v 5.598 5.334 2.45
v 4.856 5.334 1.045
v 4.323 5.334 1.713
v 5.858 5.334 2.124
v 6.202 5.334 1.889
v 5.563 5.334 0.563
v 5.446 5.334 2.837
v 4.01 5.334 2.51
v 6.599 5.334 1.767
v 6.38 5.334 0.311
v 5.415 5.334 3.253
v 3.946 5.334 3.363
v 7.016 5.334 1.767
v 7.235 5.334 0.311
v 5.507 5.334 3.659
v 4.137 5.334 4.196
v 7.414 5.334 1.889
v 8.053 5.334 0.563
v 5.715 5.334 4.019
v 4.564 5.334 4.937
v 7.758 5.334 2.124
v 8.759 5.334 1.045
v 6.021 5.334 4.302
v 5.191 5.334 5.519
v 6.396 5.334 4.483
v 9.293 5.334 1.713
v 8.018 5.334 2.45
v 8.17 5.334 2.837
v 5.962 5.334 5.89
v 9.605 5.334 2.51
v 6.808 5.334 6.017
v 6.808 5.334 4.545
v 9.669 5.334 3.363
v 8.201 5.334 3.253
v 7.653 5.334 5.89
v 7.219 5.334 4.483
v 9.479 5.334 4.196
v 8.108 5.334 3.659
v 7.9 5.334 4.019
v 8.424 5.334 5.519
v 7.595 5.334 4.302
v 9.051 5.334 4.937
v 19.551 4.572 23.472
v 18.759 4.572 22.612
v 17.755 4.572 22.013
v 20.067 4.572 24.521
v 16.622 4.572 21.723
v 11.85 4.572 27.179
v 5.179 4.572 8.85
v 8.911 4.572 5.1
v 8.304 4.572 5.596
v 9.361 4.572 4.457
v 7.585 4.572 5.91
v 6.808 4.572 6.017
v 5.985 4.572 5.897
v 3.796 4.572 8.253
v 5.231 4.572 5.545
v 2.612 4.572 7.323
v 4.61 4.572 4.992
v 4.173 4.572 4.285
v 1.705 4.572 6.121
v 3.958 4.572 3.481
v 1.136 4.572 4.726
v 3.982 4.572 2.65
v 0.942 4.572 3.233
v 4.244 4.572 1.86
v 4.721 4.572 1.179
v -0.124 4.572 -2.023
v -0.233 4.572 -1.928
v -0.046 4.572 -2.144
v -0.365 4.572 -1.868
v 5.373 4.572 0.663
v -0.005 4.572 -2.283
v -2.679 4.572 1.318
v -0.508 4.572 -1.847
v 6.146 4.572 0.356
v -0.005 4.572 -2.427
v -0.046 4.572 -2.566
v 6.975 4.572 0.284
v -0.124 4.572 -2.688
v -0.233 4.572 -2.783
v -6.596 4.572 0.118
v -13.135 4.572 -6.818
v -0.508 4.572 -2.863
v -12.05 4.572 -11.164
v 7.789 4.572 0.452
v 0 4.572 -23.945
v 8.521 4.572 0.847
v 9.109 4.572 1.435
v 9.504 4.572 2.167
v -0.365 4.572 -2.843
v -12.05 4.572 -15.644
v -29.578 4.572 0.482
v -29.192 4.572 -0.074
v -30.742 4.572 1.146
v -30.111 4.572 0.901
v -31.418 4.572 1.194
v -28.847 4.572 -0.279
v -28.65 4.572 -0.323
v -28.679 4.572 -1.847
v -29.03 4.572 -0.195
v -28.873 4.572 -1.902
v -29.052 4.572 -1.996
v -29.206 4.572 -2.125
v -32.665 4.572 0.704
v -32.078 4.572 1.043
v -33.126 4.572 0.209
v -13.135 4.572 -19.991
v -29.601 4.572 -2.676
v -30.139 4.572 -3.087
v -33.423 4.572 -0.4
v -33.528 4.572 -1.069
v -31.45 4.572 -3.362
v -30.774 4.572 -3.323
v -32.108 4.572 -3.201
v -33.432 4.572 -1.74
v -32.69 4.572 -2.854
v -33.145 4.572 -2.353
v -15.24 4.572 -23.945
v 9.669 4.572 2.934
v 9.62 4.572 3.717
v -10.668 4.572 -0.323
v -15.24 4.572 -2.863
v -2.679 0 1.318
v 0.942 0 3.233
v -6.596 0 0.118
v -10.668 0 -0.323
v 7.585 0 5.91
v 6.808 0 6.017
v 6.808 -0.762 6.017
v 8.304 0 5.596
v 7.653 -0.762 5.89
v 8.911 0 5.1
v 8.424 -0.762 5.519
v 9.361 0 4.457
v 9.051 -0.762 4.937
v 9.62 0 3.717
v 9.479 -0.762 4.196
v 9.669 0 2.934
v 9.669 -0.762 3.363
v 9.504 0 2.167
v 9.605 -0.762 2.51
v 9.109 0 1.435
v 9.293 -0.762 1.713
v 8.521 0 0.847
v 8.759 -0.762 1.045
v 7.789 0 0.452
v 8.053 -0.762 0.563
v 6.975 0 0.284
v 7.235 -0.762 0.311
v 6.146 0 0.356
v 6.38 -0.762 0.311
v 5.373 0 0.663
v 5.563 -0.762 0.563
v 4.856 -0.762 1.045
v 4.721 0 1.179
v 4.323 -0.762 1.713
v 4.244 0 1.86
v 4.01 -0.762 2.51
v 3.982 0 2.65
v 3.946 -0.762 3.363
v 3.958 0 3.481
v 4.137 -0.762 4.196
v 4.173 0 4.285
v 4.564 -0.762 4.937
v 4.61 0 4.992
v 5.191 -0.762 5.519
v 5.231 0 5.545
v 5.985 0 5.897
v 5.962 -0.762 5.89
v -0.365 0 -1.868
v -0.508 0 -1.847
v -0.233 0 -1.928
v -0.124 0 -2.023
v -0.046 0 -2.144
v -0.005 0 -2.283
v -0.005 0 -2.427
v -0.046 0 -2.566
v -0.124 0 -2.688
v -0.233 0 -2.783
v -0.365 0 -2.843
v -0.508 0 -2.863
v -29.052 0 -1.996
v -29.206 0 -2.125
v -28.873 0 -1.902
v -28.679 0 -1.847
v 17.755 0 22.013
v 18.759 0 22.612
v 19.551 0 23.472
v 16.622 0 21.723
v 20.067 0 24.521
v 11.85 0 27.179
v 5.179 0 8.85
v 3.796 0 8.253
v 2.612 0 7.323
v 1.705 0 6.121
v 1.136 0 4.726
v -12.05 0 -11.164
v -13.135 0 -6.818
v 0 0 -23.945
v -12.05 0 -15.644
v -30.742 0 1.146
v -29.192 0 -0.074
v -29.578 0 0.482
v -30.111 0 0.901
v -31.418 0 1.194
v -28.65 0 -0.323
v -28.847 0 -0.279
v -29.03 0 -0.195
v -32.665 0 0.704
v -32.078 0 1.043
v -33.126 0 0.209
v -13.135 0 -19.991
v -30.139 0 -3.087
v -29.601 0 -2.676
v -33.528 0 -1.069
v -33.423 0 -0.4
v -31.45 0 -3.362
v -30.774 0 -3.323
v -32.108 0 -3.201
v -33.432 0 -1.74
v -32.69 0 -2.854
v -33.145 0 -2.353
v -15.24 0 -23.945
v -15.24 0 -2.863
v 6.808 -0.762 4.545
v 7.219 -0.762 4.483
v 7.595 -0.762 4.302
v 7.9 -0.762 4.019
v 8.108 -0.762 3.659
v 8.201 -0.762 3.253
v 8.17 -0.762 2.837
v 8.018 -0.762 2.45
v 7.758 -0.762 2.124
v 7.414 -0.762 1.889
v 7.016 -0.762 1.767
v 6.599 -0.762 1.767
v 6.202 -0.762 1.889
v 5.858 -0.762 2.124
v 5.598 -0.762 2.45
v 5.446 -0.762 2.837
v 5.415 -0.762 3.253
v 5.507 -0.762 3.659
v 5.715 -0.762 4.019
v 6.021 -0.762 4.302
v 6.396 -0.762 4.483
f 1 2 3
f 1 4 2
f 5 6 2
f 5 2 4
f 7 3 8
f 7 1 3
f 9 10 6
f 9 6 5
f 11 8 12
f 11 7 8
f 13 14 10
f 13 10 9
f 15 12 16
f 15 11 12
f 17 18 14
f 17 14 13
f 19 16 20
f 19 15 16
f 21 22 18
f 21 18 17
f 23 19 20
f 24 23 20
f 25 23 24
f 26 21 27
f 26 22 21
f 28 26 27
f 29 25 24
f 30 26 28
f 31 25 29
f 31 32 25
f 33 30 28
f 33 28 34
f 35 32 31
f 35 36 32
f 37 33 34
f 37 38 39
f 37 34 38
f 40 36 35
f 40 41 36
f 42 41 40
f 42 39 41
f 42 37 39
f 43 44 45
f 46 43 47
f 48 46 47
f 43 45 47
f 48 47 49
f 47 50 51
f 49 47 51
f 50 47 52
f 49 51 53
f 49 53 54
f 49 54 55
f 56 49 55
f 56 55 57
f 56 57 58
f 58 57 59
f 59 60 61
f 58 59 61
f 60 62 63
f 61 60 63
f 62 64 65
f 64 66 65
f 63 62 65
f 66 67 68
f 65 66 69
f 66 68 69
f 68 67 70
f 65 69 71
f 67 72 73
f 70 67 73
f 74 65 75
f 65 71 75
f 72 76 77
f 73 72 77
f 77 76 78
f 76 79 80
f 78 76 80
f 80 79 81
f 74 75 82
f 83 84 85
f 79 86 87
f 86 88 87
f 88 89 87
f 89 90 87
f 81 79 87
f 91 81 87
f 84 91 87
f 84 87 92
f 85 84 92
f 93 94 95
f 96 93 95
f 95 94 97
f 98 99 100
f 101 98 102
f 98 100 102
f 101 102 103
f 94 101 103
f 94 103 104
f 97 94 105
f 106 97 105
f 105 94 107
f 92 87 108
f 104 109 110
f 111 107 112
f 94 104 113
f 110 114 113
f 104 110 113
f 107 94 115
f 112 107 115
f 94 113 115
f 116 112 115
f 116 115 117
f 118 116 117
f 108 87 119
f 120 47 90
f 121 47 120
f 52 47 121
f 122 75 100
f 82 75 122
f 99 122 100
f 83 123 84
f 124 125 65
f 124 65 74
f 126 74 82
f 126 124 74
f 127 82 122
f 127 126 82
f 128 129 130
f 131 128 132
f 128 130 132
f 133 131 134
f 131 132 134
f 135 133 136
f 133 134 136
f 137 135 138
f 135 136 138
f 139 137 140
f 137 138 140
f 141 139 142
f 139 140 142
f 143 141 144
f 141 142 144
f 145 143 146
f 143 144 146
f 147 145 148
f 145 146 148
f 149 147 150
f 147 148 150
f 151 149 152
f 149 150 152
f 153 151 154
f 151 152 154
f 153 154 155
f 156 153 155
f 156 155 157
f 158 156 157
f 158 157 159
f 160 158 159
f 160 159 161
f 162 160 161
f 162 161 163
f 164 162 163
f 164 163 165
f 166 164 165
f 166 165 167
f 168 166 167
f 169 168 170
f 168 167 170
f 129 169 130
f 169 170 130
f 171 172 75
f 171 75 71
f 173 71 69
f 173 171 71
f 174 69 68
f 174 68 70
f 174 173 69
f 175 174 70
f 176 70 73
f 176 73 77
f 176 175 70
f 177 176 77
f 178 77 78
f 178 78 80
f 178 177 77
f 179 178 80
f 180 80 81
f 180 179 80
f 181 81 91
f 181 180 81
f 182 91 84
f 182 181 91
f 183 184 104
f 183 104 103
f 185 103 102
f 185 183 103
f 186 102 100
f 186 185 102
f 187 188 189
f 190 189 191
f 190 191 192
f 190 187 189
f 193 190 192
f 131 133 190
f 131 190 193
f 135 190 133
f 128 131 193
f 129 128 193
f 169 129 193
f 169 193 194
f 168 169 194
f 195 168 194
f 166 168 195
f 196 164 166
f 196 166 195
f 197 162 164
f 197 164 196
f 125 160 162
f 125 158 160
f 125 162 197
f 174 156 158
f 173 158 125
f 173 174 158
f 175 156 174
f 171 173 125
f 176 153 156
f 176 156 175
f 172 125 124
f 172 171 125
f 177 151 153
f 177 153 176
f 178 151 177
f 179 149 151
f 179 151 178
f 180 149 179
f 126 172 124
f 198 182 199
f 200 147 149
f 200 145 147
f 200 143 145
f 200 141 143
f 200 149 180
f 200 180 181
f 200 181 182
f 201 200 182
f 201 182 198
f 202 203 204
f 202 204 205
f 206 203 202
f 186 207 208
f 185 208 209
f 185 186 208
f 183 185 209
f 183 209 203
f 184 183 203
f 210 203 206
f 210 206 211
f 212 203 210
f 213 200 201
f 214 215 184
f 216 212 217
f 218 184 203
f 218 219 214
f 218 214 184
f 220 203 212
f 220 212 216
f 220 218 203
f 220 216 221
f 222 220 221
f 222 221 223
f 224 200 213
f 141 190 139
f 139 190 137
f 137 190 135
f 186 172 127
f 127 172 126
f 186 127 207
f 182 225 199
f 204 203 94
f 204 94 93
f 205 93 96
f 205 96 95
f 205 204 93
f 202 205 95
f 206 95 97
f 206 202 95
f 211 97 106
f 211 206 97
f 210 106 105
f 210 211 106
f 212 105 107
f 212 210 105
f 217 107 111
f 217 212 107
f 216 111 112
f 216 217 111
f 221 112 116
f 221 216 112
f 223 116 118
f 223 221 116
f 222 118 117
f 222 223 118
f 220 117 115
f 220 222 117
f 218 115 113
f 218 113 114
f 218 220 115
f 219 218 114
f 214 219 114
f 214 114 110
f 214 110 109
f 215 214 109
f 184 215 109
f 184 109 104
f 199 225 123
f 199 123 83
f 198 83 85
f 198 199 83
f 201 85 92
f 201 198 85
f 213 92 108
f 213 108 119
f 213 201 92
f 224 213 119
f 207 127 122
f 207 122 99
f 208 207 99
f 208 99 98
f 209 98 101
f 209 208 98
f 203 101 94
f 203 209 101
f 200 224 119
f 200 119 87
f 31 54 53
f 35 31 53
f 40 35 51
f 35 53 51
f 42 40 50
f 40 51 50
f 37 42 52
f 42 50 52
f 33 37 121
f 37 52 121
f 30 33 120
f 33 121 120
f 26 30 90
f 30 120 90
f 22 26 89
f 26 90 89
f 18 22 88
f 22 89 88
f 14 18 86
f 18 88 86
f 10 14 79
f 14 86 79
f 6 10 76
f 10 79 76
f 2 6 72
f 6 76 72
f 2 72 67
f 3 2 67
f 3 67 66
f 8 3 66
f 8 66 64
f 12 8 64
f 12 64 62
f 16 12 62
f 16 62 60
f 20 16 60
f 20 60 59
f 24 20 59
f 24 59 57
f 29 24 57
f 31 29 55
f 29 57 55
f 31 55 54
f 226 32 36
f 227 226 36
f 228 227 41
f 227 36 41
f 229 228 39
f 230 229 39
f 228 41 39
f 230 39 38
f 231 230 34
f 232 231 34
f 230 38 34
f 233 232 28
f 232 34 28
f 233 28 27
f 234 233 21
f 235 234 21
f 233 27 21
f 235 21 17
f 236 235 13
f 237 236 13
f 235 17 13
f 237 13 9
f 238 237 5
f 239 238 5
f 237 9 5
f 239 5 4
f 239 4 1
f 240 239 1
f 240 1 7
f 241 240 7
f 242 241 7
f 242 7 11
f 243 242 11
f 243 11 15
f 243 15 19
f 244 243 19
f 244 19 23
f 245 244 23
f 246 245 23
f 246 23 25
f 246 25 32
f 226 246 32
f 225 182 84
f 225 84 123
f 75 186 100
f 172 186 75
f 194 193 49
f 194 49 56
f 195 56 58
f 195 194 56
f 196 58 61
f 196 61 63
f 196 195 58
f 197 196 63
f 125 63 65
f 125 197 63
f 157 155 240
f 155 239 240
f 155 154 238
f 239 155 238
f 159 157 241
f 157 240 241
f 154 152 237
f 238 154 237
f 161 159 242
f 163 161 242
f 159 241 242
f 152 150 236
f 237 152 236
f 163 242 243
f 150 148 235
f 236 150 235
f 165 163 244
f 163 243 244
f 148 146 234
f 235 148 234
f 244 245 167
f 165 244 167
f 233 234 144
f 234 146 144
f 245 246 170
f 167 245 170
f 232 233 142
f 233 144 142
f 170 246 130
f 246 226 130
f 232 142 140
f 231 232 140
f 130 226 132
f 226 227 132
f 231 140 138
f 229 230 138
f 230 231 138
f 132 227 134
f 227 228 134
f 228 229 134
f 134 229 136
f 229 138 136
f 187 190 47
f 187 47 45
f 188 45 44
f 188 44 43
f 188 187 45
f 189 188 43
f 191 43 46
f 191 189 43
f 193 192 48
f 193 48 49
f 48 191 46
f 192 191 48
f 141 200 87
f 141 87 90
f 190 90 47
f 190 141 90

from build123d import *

# Parameters (mm, degrees)
BOSS_EXTRUDE1_DEPTH      = 4.572
BOSS_EXTRUDE2_DEPTH      = 0.762
BOSS_EXTRUDE2_DEPTH_BACK = 5.334
SKETCH2_R                = 2.869299529
SKETCH3_R                = 1.397
CUT_EXTRUDE1_DEPTH       = 44.588683524


with BuildPart() as part:
    # Sketch1 → Boss-Extrude1 (new body)
    with BuildSketch(Plane(origin=(0, 0, 0), x_dir=(1, 0, 0), z_dir=(0, 1, 0))):
        with BuildLine():
            Line((0, 23.945183489), (16.621899459, -21.723109944))
            ThreePointArc((16.621899459, -21.723109944), (18.758742816, -22.611950557), (20.0669487, -24.521069341))
            Line((20.0669487, -24.521069341), (11.850067084, -27.178766186))
            Line((11.850067084, -27.178766186), (5.178997556, -8.850153293))
            ThreePointArc((5.178997556, -8.850153293), (2.119691783, -6.751008186), (0.941519753, -3.232816511))
            ThreePointArc((0.941519753, -3.232816511), (-4.609142435, -0.625246171), (-10.668, 0.323183489))
            Line((-10.668, 0.323183489), (-28.650367288, 0.323183489))
            ThreePointArc((-28.650367288, 0.323183489), (-28.941106082, 0.241834206), (-29.19191304, 0.073778793))
            ThreePointArc((-29.19191304, 0.073778793), (-33.527942998, 1.06904003), (-29.206401998, 2.125441522))
            ThreePointArc((-29.206401998, 2.125441522), (-28.965026953, 1.944099747), (-28.679100404, 1.847183489))
            Line((-28.679100404, 1.847183489), (-0.508, 1.847183489))
            ThreePointArc((-0.508, 1.847183489), (0, 2.355183489), (-0.508, 2.863183489))
            Line((-0.508, 2.863183489), (-15.24, 2.863183489))
            ThreePointArc((-15.24, 2.863183489), (-11.9126, 13.404183489), (-15.24, 23.945183489))
            Line((-15.24, 23.945183489), (0, 23.945183489))
        make_face()
    extrude(amount=BOSS_EXTRUDE1_DEPTH)

    # Sketch2 → Boss-Extrude2 (add, two sides: drawn at the far end of the back side and taken through both)
    with BuildSketch(Plane(origin=(0, 4.572, 0), x_dir=(1, 0, 0), z_dir=(0, 1, 0)).offset(-BOSS_EXTRUDE2_DEPTH_BACK)):
        with Locations(Location((6.807711808, -3.148121568, 0), (0, 0, 270))):
            Circle(SKETCH2_R)
    extrude(amount=BOSS_EXTRUDE2_DEPTH + BOSS_EXTRUDE2_DEPTH_BACK)

    # Sketch3 → Cut-Extrude1 (cut, through all)
    with BuildSketch(Plane(origin=(0, 5.334, 0), x_dir=(1, 0, 0), z_dir=(0, 1, 0))):
        with Locations(Location((6.807711808, -3.148121568, 0), (0, 0, 270))):
            Circle(SKETCH3_R)
    extrude(amount=-CUT_EXTRUDE1_DEPTH, mode=Mode.SUBTRACT)


solid = part.part
